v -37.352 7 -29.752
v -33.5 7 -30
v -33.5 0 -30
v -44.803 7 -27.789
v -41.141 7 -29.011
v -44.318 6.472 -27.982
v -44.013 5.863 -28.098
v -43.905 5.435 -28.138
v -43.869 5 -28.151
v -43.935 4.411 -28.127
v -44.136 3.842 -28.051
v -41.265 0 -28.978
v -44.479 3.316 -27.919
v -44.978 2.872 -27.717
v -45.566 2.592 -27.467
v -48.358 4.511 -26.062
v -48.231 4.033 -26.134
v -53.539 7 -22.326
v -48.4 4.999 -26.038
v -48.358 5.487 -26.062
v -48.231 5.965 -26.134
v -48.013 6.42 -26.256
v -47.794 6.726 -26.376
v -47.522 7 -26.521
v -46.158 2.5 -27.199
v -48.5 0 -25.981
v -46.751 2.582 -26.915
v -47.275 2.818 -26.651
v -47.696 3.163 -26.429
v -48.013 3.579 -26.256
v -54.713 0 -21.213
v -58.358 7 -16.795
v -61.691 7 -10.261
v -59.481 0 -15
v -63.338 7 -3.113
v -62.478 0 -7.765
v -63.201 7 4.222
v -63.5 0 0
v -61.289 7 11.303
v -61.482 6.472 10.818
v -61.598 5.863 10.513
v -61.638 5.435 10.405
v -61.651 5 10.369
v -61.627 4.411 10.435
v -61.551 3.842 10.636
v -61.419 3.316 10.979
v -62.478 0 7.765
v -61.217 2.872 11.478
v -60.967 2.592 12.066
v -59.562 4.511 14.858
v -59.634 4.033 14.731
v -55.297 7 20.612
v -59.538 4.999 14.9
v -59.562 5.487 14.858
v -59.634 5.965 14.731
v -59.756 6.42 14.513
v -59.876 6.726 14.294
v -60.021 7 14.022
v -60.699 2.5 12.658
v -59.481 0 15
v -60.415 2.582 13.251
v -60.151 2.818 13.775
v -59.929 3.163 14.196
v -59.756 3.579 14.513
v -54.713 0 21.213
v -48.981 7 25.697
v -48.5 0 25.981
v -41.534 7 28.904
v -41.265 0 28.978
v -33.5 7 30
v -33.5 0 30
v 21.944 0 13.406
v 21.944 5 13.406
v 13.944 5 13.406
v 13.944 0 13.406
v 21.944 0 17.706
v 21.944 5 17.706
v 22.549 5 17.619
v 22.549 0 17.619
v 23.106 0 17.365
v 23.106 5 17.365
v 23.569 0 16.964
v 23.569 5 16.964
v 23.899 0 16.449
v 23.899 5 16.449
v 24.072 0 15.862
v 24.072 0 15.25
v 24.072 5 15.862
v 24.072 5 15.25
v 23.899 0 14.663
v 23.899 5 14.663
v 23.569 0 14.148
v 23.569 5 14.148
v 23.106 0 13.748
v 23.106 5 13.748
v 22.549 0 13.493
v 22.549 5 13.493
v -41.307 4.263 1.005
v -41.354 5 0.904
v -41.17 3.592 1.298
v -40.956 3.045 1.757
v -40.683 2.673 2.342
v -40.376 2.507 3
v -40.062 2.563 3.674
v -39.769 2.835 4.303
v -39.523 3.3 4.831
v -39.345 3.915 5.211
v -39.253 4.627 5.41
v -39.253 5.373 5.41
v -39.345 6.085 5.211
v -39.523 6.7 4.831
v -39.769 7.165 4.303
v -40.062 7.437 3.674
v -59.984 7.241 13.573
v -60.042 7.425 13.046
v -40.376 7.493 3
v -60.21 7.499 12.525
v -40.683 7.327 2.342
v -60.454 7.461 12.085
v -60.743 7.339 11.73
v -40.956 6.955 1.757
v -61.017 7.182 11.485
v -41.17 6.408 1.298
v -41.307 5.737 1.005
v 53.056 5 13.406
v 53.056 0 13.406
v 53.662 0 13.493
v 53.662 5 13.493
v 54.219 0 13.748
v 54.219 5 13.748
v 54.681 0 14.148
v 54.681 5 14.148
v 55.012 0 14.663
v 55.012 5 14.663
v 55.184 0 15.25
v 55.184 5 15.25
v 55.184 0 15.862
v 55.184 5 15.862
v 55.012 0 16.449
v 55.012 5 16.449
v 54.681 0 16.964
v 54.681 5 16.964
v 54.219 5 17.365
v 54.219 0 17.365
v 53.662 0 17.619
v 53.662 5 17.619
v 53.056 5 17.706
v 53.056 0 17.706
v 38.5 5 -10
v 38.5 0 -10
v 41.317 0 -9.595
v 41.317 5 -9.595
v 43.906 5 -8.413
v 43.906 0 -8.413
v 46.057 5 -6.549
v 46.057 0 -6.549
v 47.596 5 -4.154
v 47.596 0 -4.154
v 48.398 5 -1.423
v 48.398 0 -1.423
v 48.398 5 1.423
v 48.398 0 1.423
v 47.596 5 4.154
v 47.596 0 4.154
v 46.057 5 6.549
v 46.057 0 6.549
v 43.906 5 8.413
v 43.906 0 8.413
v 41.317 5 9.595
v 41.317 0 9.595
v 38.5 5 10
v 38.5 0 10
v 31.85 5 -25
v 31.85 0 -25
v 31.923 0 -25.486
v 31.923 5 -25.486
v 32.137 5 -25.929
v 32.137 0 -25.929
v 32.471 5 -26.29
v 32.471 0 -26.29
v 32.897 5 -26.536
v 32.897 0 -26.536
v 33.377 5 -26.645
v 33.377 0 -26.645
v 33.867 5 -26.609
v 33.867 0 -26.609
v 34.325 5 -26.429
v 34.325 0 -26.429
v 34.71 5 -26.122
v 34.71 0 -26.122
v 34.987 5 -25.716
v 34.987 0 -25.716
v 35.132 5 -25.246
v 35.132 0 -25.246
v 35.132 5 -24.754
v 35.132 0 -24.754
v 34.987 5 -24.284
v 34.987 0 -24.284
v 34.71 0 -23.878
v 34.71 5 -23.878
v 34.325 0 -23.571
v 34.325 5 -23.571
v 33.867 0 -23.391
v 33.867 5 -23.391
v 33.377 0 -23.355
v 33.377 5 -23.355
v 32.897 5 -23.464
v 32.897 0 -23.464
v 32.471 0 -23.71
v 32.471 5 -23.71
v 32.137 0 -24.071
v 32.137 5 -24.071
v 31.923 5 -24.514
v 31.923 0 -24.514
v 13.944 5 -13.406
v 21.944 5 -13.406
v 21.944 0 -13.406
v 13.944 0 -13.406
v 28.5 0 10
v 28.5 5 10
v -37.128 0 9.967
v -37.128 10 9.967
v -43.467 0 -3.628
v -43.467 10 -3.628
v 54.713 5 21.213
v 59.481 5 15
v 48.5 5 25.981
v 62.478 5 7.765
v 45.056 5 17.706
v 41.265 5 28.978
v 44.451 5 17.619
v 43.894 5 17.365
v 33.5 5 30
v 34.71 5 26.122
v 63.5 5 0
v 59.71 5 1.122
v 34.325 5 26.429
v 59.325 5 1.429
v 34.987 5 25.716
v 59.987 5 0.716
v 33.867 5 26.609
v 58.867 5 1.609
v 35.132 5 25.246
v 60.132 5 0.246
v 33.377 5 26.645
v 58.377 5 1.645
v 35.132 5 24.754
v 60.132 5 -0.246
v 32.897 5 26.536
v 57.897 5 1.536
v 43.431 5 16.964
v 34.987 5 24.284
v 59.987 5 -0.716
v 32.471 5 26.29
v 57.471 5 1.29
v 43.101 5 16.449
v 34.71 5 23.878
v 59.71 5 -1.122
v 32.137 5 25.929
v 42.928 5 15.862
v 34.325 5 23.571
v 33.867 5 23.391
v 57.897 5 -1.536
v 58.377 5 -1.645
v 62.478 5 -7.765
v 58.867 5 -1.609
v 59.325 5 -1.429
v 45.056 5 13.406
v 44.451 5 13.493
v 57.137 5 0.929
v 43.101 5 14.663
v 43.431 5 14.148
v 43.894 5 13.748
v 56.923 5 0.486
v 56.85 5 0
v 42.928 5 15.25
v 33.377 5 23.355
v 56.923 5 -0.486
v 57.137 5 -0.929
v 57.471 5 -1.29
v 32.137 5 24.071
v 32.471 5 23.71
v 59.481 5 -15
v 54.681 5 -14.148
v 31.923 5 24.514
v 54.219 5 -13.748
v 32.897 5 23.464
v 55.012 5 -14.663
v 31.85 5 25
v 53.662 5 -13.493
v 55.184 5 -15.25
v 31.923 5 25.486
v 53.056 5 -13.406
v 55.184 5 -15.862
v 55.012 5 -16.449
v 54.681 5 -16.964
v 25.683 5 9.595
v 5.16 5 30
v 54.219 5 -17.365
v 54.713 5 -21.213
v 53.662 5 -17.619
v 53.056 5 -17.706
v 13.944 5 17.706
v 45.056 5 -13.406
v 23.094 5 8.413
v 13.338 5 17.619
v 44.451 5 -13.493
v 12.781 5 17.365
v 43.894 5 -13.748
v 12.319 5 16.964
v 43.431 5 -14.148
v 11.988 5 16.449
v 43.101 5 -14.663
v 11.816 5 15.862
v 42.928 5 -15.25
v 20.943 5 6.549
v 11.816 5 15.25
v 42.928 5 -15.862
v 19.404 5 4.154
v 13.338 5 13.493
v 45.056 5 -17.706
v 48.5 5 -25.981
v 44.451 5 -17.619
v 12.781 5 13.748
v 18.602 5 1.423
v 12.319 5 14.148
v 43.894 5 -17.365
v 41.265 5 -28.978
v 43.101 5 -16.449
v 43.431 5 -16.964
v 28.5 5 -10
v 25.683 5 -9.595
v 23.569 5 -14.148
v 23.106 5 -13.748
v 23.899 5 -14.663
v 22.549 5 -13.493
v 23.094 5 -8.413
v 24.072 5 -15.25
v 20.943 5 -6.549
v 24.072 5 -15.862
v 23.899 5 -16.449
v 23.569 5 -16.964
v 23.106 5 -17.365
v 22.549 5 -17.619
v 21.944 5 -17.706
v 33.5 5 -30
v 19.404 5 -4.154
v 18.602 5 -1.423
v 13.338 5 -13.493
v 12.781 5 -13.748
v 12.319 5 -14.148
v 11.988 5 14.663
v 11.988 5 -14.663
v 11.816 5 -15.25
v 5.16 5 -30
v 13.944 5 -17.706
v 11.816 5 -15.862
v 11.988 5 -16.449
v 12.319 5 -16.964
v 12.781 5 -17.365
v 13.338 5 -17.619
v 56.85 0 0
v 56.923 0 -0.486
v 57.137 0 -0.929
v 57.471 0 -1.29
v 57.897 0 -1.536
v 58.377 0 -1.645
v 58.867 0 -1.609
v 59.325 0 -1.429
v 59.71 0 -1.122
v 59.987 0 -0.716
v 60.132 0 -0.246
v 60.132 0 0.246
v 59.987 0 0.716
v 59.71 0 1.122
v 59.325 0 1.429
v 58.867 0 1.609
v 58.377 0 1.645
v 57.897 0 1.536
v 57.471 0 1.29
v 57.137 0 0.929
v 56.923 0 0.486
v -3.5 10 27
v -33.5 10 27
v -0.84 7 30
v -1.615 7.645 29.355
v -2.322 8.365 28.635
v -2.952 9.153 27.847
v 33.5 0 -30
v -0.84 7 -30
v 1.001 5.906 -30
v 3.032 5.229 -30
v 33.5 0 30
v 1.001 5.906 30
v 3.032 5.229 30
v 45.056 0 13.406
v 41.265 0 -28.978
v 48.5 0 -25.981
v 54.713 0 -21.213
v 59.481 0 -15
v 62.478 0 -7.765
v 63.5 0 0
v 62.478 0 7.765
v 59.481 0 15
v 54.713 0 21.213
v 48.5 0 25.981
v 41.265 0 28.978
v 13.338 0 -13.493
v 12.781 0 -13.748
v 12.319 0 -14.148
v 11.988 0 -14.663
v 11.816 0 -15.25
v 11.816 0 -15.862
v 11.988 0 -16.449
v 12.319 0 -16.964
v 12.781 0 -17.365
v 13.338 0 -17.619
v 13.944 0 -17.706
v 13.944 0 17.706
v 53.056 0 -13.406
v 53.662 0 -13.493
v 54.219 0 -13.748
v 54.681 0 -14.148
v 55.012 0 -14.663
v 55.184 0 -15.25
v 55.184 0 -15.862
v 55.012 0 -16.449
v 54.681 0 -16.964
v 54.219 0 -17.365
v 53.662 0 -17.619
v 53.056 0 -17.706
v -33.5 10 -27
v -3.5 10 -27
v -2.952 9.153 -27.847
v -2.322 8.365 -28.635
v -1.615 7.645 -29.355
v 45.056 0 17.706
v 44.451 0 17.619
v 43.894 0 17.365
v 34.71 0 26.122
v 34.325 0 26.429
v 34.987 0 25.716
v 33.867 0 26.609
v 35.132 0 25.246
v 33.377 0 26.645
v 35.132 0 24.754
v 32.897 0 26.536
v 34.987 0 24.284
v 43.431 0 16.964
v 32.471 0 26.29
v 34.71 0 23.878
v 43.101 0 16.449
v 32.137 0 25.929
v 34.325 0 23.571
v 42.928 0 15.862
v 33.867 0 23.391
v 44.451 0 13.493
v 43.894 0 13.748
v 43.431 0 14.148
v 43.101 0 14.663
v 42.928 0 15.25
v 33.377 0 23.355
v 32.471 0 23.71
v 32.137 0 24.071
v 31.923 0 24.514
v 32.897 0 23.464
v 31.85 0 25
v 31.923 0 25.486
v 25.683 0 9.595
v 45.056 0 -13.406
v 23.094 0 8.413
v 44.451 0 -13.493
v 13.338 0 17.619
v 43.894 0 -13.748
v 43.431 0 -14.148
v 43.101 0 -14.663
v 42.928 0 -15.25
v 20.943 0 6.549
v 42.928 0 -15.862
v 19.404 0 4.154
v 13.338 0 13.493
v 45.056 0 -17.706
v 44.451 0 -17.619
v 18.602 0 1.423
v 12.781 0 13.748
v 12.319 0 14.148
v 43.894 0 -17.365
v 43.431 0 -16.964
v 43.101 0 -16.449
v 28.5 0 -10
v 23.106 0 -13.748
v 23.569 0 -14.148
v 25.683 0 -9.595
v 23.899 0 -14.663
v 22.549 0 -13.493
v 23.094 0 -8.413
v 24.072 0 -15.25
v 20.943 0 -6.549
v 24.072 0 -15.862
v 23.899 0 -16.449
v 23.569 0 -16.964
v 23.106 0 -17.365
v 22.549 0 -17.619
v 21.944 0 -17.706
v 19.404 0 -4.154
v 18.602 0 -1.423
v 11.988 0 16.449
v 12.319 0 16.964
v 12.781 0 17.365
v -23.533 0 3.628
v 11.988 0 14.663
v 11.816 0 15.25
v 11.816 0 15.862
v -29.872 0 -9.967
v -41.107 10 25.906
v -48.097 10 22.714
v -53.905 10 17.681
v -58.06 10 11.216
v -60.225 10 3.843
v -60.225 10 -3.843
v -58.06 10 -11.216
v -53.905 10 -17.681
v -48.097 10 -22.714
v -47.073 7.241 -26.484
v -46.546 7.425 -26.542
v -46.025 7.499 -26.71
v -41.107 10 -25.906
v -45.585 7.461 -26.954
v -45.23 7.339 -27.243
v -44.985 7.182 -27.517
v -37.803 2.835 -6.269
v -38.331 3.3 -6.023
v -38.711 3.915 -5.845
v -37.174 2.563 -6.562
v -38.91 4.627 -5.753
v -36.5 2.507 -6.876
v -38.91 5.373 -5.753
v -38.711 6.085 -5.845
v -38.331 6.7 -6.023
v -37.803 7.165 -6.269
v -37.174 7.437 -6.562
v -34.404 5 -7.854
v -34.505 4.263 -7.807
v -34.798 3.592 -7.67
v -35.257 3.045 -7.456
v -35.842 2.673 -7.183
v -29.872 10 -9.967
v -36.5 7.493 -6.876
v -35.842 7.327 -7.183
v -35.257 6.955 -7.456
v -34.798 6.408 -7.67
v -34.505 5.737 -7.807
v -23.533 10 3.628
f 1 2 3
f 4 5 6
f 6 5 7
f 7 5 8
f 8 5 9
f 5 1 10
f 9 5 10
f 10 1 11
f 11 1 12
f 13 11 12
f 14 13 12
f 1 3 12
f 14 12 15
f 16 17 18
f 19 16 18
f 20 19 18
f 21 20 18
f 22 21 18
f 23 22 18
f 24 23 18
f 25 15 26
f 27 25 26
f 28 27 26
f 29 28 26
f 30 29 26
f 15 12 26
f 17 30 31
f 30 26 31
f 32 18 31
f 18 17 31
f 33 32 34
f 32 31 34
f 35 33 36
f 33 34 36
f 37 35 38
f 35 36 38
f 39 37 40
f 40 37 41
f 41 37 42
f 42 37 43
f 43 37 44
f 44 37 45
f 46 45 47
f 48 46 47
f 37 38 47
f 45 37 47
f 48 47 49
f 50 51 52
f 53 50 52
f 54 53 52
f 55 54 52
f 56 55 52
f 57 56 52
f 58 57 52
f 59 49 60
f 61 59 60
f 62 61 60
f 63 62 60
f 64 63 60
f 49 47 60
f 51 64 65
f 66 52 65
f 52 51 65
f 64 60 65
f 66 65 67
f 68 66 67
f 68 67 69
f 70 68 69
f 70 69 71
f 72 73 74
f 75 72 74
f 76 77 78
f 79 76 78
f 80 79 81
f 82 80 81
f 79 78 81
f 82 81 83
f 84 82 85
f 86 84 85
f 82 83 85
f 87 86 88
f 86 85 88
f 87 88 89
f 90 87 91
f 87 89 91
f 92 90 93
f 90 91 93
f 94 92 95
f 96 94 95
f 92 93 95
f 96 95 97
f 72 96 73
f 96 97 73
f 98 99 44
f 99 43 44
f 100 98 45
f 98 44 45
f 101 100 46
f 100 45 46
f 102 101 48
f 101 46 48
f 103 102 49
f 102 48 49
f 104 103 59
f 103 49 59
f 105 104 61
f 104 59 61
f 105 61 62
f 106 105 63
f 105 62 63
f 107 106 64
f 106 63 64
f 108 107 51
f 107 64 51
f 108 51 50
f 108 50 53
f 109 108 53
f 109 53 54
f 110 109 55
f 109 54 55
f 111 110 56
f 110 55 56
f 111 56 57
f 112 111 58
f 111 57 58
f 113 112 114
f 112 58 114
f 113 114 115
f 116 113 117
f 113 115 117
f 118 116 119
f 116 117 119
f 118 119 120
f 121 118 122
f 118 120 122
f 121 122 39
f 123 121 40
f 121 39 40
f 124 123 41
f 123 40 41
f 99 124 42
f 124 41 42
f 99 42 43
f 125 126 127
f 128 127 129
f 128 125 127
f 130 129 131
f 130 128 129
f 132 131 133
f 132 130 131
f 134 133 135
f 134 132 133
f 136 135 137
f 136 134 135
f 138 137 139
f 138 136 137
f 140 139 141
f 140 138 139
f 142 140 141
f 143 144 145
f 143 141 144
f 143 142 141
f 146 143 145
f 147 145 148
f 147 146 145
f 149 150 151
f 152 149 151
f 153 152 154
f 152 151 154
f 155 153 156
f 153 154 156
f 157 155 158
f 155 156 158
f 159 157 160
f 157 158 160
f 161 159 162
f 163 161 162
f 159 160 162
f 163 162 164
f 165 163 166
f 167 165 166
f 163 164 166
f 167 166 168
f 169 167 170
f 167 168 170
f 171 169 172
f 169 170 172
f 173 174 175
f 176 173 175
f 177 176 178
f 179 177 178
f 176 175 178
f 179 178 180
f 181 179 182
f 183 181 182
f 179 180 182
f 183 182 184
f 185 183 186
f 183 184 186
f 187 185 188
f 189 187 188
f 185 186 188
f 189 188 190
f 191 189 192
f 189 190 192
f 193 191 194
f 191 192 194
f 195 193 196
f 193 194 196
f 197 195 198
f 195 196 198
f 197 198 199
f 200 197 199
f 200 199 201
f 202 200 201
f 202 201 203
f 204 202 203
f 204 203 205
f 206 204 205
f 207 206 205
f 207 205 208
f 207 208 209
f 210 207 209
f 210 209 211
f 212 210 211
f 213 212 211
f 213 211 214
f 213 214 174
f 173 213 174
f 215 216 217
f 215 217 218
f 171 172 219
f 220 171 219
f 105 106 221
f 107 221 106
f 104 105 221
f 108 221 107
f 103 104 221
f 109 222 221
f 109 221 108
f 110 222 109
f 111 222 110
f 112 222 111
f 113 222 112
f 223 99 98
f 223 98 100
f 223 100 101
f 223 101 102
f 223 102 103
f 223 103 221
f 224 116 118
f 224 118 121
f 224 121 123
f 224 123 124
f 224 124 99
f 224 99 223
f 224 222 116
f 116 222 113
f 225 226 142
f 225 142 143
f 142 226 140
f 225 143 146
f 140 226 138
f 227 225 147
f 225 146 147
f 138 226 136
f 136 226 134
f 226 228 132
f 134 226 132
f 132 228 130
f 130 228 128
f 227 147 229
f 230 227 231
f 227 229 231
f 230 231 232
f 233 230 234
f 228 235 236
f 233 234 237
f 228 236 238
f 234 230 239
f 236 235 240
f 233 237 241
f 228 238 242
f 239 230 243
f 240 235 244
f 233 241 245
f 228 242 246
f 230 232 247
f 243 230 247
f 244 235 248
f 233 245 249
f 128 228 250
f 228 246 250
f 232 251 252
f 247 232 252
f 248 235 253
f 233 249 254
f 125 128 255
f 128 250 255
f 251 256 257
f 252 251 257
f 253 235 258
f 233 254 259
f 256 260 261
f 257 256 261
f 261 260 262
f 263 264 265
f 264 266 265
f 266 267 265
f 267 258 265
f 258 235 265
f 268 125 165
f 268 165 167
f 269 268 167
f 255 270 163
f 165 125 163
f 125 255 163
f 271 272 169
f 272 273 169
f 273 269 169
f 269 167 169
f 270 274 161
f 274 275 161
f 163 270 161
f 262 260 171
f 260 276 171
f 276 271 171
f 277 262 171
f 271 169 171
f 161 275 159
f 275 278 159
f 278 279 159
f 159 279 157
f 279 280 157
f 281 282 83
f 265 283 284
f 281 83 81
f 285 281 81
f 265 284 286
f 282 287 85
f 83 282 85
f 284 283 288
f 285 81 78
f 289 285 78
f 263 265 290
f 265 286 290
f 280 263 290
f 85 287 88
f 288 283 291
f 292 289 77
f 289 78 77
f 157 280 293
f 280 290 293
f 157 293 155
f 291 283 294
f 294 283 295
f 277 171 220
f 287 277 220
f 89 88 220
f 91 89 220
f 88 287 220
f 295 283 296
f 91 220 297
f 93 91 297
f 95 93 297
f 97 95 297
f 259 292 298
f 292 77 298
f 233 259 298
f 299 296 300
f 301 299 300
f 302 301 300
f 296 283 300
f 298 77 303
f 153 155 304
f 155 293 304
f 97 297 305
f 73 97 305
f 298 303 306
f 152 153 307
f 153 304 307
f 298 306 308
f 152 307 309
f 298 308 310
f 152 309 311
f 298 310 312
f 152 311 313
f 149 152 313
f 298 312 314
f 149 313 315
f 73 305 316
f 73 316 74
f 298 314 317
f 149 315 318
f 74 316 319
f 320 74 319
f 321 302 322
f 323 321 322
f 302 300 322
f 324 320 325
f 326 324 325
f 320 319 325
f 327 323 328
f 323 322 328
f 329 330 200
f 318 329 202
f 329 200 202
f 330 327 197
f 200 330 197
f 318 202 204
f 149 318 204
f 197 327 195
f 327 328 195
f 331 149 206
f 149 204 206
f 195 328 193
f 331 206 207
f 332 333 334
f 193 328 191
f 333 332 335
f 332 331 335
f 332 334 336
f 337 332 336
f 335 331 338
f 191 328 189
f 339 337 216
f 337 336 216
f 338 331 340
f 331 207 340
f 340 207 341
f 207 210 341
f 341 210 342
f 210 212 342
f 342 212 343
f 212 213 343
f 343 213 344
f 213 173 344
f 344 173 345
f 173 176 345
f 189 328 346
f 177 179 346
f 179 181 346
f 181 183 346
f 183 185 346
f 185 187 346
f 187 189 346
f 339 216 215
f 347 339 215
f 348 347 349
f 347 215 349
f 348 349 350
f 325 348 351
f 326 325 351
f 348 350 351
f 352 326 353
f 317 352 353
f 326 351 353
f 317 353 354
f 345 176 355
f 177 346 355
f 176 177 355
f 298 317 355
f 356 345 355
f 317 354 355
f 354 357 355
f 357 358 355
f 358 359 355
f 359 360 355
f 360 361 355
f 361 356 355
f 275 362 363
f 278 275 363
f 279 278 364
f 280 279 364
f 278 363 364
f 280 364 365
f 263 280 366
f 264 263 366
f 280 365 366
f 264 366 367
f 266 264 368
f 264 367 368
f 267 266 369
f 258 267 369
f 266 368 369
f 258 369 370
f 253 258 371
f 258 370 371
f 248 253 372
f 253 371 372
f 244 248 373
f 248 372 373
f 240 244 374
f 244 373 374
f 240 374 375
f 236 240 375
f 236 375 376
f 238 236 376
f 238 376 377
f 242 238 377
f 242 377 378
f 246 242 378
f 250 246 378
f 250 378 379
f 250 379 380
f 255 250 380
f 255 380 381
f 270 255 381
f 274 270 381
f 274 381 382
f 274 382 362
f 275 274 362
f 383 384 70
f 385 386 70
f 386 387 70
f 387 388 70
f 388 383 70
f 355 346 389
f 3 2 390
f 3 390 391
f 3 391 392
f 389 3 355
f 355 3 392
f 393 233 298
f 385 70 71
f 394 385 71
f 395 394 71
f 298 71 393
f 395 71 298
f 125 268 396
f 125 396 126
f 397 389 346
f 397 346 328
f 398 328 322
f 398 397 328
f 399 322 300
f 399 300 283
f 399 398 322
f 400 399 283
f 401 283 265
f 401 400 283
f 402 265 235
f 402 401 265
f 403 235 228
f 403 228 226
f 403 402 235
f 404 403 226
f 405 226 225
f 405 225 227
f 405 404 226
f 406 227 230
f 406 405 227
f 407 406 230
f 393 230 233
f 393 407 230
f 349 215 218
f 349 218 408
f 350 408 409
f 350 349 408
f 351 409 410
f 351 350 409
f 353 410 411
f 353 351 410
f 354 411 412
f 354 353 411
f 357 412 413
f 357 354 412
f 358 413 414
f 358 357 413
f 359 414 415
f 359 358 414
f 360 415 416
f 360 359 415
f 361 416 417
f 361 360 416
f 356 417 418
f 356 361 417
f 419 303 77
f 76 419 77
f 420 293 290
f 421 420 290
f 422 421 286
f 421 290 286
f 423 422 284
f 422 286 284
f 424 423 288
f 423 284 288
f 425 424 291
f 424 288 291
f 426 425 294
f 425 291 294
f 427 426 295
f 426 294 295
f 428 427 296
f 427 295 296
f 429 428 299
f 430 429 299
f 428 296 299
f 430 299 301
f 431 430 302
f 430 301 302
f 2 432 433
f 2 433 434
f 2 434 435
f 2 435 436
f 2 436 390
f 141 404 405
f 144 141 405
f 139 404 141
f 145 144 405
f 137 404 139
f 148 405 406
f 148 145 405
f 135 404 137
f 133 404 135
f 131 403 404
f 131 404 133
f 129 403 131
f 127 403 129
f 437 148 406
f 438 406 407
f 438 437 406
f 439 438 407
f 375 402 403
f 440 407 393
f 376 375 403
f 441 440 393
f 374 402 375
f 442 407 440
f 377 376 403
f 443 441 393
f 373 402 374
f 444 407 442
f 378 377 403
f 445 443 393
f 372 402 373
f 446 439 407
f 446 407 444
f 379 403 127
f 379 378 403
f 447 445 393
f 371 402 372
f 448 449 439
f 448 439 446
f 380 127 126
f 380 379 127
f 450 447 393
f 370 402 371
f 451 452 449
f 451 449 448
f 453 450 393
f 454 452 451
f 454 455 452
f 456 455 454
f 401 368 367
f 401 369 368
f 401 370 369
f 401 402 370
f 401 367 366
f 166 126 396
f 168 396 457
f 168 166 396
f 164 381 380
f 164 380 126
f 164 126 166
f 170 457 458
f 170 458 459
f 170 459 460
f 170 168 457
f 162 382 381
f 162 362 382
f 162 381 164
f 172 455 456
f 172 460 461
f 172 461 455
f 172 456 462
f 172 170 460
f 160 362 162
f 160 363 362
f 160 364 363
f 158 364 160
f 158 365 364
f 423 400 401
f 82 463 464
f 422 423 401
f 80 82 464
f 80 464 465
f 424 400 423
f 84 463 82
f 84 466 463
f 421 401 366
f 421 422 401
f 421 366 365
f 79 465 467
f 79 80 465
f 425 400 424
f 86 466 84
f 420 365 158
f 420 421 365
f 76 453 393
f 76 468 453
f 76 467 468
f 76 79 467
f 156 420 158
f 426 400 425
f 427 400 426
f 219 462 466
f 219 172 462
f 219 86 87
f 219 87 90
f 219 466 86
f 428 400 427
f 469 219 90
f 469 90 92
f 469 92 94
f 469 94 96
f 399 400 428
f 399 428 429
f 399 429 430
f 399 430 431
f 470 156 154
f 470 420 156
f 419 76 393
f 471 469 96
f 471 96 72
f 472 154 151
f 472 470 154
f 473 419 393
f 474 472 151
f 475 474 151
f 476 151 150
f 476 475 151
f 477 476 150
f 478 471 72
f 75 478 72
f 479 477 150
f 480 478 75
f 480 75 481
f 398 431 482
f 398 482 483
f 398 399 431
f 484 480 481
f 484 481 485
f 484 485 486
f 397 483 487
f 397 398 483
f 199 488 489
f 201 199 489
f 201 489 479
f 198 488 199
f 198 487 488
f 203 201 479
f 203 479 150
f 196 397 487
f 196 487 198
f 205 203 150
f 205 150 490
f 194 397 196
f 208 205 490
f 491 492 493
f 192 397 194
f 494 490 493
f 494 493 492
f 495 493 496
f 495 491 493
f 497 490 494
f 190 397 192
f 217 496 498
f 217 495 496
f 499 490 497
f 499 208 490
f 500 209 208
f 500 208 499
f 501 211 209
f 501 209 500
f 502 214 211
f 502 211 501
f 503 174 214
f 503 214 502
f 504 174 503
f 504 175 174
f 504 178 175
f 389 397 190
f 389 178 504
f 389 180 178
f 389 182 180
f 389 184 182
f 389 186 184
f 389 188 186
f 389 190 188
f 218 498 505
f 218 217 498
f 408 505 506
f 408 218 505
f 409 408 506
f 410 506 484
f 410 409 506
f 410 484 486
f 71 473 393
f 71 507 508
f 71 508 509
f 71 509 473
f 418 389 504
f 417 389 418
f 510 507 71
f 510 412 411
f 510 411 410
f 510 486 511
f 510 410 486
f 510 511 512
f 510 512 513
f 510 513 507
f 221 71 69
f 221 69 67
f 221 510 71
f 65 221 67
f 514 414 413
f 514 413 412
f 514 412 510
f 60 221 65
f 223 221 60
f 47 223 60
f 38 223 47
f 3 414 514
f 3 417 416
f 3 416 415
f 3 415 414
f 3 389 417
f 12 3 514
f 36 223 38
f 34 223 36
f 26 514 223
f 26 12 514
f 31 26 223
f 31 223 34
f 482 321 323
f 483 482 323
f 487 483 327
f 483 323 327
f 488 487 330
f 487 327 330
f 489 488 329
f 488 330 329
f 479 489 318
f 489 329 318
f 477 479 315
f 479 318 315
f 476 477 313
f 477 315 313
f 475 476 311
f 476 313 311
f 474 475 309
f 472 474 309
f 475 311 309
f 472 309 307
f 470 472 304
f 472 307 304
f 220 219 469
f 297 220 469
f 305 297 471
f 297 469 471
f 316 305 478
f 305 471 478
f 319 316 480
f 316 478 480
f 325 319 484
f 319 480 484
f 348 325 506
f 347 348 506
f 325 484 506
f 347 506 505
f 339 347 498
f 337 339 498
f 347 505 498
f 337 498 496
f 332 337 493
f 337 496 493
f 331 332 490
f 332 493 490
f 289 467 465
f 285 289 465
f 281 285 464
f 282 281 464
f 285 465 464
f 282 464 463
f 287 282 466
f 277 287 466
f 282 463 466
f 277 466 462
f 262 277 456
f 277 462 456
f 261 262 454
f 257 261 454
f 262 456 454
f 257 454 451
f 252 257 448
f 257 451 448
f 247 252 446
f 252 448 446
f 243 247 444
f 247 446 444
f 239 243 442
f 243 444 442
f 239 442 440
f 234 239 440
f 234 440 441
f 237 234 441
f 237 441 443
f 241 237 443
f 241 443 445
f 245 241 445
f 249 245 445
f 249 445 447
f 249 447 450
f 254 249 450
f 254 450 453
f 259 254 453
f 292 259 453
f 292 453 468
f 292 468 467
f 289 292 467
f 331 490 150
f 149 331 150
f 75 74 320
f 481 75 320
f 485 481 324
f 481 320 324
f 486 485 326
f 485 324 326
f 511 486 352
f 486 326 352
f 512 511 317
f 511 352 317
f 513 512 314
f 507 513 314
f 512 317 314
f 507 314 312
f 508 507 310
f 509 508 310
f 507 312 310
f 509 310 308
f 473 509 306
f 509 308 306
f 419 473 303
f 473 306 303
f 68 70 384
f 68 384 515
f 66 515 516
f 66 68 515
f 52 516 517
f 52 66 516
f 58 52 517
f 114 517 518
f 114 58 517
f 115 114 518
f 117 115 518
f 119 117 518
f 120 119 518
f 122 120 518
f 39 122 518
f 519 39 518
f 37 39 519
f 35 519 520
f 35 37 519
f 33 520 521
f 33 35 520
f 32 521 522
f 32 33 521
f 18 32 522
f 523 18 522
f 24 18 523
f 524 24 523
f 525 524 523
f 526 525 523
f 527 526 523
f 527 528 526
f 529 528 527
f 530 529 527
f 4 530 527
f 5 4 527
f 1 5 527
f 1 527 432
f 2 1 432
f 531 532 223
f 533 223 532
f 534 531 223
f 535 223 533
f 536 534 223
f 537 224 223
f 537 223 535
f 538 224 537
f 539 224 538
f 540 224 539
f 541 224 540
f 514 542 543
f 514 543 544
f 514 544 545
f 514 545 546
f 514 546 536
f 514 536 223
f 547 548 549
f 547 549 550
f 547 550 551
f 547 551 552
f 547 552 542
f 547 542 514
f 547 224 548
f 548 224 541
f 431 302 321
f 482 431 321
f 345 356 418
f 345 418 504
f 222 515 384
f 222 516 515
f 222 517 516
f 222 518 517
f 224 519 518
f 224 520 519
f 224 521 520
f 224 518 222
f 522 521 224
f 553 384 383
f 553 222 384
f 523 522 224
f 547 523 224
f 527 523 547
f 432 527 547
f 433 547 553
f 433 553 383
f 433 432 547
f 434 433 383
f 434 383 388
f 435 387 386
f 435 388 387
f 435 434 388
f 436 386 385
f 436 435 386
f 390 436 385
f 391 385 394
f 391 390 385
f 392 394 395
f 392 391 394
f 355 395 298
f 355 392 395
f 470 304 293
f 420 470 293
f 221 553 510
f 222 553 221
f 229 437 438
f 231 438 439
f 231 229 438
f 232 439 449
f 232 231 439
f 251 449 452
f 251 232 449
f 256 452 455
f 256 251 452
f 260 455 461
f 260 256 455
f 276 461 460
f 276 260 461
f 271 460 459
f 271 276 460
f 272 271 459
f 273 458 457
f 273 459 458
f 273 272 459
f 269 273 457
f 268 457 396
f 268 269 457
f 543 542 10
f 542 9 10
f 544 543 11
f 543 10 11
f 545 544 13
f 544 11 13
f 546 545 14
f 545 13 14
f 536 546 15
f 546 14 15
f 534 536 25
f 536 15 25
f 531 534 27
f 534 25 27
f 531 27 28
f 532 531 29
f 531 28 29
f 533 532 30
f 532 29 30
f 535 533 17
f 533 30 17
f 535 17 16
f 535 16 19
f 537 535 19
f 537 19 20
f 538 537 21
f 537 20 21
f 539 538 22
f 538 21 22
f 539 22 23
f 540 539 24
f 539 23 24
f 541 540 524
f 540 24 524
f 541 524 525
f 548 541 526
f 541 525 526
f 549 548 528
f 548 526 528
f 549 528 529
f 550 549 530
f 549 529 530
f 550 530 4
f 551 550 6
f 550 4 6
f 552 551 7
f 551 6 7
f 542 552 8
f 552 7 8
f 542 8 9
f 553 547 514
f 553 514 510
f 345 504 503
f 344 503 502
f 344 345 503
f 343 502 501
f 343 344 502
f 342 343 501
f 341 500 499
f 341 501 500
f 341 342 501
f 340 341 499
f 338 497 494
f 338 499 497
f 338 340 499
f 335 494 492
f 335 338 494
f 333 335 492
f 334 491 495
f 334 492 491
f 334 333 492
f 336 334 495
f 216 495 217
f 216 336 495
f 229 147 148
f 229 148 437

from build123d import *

# Parameters (mm, degrees)
BOSS_EXTRUDE1_DEPTH = 5
CUT_EXTRUDE1_DEPTH  = 71.407741052
BOSS_EXTRUDE2_DEPTH = 5
FILLET1_R           = 10
CUT_EXTRUDE2_DEPTH  = 71.938353519
M4_TAPPED_HOLE1_D   = 3.3
SKETCH13_W          = 2.5
SKETCH13_H          = 32.367781463
SKETCH17_W          = 2.5
SKETCH17_H          = 32.367781463
CHAMFER1_SIZE       = 3


with BuildPart() as part:
    # Sketch1 → Boss-Extrude1 (new body)
    with BuildSketch(Plane(origin=(0, 0, 0), x_dir=(1, 0, 0), z_dir=(0, 1, 0))):
        with BuildLine():
            Line((-33.5, 30), (33.5, 30))
            ThreePointArc((33.5, 30), (63.5, 0), (33.5, -30))
            Line((33.5, -30), (-33.5, -30))
            ThreePointArc((-33.5, -30), (-63.5, 0), (-33.5, 30))
        make_face()
        with BuildLine():
            Line((28.5, 10), (38.5, 10))
            ThreePointArc((38.5, 10), (48.5, 0), (38.5, -10))
            Line((38.5, -10), (28.5, -10))
            ThreePointArc((28.5, -10), (18.5, 0), (28.5, 10))
        make_face(mode=Mode.SUBTRACT)
    extrude(amount=BOSS_EXTRUDE1_DEPTH)

    # Sketch2 → Cut-Extrude1 (cut, through all)
    with BuildSketch(Plane(origin=(0, 5, 0), x_dir=(1, 0, 0), z_dir=(0, 1, 0))):
        with BuildLine():
            Line((13.943650814, 17.706349186), (21.943650814, 17.706349186))
            ThreePointArc((21.943650814, 17.706349186), (24.093650814, 15.556349186), (21.943650814, 13.406349186))
            Line((21.943650814, 13.406349186), (13.943650814, 13.406349186))
            ThreePointArc((13.943650814, 13.406349186), (11.793650814, 15.556349186), (13.943650814, 17.706349186))
        make_face()
        with BuildLine():
            Line((53.056349186, 17.706349186), (45.056349186, 17.706349186))
            ThreePointArc((45.056349186, 17.706349186), (42.906349186, 15.556349186), (45.056349186, 13.406349186))
            Line((45.056349186, 13.406349186), (53.056349186, 13.406349186))
            ThreePointArc((53.056349186, 13.406349186), (55.206349186, 15.556349186), (53.056349186, 17.706349186))
        make_face()
        with BuildLine():
            Line((53.056349186, -17.706349186), (45.056349186, -17.706349186))
            ThreePointArc((45.056349186, -17.706349186), (42.906349186, -15.556349186), (45.056349186, -13.406349186))
            Line((45.056349186, -13.406349186), (53.056349186, -13.406349186))
            ThreePointArc((53.056349186, -13.406349186), (55.206349186, -15.556349186), (53.056349186, -17.706349186))
        make_face()
        with BuildLine():
            Line((13.943650814, -17.706349186), (21.943650814, -17.706349186))
            ThreePointArc((21.943650814, -17.706349186), (24.093650814, -15.556349186), (21.943650814, -13.406349186))
            Line((21.943650814, -13.406349186), (13.943650814, -13.406349186))
            ThreePointArc((13.943650814, -13.406349186), (11.793650814, -15.556349186), (13.943650814, -17.706349186))
        make_face()
    extrude(amount=-CUT_EXTRUDE1_DEPTH, mode=Mode.SUBTRACT)

    # Sketch8 → Boss-Extrude2 (add)
    with BuildSketch(Plane(origin=(0, 5, 0), x_dir=(1, 0, 0), z_dir=(0, 1, 0))):
        with BuildLine():
            ThreePointArc((-33.5, -30), (-12.286796564, -21.213203436), (-3.5, 0))
            ThreePointArc((-3.5, 0), (-12.286796564, 21.213203436), (-33.5, 30))
            ThreePointArc((-33.5, 30), (-63.5, 0), (-33.5, -30))
        make_face()
        with BuildLine():
            Line((-3.5, 0), (-3.5, 30))
            Line((-3.5, 30), (-33.5, 30))
            ThreePointArc((-33.5, 30), (-12.286796564, 21.213203436), (-3.5, 0))
        make_face()
        with BuildLine():
            Line((-3.5, -30), (-3.5, 0))
            ThreePointArc((-3.5, 0), (-12.286796564, -21.213203436), (-33.5, -30))
            Line((-33.5, -30), (-3.5, -30))
        make_face()
    extrude(amount=BOSS_EXTRUDE2_DEPTH)

    # Fillet1
    # the kernel refuses this fillet: 10 mm, written as the material it adds along each edge
    with BuildSketch(Plane(origin=(-3.5, 5, -30), x_dir=(0, 1, 0), z_dir=(0, 0, 1))) as fillet1_piece_1:
        with BuildLine():
            CenterArc((10, -8.660254038), FILLET1_R, 120, 60)
            Line((0, -8.660254038), (-0.2, -8.660254038))
            Line((-0.2, -8.660254038), (-0.2, 0))
            Line((-0.2, 0), (0, 0.2))
            ThreePointArc((0, 0.2), (2.5, 0.2), (4.9, 0.173205081))
            Line((4.9, 0.173205081), (5, 0))
        make_face()
    extrude(amount=60)

    # Sketch9 → Cut-Extrude2 (cut, through all)
    with BuildSketch(Plane(origin=(0, 10, 0), x_dir=(1, 0, 0), z_dir=(0, 1, 0))):
        Polygon((-29.87232856, 9.966945366), (-23.533054634, -3.62767144), (-37.12767144, -9.966945366), (-43.466945366, 3.62767144), align=None)
    extrude(amount=-CUT_EXTRUDE2_DEPTH, mode=Mode.SUBTRACT)

    # M4 Tapped Hole1 (through all)
    with Locations(Plane(origin=(0, 5, 0), x_dir=(1, 0, 0), z_dir=(0, 1, 0))):
        with Locations((58.5, 0), (33.5, 25), (33.5, -25)):
            Hole(M4_TAPPED_HOLE1_D / 2)

    # Sketch13 → M6 Tapped Hole1 (revolve, cut)
    with BuildSketch(Plane(origin=(-40.297308403, 5, 3.169636963), x_dir=(-0.4226182617406973, 0, -0.9063077870366509), z_dir=(0, 1, 0))):
        with Locations((1.25, 16.183890732)):
            Rectangle(SKETCH13_W, SKETCH13_H)
    revolve(axis=Axis((-34.542253955, 5, 0.486011001), (-0.9063077870366509, 0, 0.42261826174069733)), mode=Mode.SUBTRACT)

    # Sketch17 → M6 Tapped Hole3 (revolve, cut)
    with BuildSketch(Plane(origin=(-36.669636963, 5, -6.797308403), x_dir=(0.9063077870366509, 0, -0.42261826174069766), z_dir=(0, 1, 0))):
        with Locations((1.25, 16.183890732)):
            Rectangle(SKETCH17_W, SKETCH17_H)
    revolve(axis=Axis((-33.986011001, 5, -1.042253955), (-0.42261826174069766, 0, -0.9063077870366508)), mode=Mode.SUBTRACT)

    # Chamfer1
    # the kernel refuses this chamfer: 3 mm, written as the material it takes off along each edge
    with BuildSketch(Plane(origin=(-33.5, 10, 30), x_dir=(0, 0.02749587661058619, -0.9996219169112968), z_dir=(1, 0, 0)), Plane(origin=(4.215048964, 10, -30), x_dir=(0, 0.02749587661058619, 0.9996219169112968), z_dir=(-1, 0, 0))) as chamfer1_piece_1:
        Polygon((CHAMFER1_SIZE * 0.999621916911, -CHAMFER1_SIZE * 0.0274958766106), (-CHAMFER1_SIZE * 0.0274958766106, -CHAMFER1_SIZE * 0.999621916911), (0, 0), align=None)
    extrude(amount=37.715048964, mode=Mode.SUBTRACT)
    with BuildSketch(Plane(origin=(-33.5, 10, 0), x_dir=(0, 0, 1), z_dir=(1, 0, 0))) as chamfer1_piece_2:
        Polygon((30 - CHAMFER1_SIZE, 0), (30, CHAMFER1_SIZE), (30, 0), align=None)
    revolve(axis=Axis((-33.5, 10, 0), (0, -1, 0)), revolution_arc=180, mode=Mode.SUBTRACT)


solid = part.part
